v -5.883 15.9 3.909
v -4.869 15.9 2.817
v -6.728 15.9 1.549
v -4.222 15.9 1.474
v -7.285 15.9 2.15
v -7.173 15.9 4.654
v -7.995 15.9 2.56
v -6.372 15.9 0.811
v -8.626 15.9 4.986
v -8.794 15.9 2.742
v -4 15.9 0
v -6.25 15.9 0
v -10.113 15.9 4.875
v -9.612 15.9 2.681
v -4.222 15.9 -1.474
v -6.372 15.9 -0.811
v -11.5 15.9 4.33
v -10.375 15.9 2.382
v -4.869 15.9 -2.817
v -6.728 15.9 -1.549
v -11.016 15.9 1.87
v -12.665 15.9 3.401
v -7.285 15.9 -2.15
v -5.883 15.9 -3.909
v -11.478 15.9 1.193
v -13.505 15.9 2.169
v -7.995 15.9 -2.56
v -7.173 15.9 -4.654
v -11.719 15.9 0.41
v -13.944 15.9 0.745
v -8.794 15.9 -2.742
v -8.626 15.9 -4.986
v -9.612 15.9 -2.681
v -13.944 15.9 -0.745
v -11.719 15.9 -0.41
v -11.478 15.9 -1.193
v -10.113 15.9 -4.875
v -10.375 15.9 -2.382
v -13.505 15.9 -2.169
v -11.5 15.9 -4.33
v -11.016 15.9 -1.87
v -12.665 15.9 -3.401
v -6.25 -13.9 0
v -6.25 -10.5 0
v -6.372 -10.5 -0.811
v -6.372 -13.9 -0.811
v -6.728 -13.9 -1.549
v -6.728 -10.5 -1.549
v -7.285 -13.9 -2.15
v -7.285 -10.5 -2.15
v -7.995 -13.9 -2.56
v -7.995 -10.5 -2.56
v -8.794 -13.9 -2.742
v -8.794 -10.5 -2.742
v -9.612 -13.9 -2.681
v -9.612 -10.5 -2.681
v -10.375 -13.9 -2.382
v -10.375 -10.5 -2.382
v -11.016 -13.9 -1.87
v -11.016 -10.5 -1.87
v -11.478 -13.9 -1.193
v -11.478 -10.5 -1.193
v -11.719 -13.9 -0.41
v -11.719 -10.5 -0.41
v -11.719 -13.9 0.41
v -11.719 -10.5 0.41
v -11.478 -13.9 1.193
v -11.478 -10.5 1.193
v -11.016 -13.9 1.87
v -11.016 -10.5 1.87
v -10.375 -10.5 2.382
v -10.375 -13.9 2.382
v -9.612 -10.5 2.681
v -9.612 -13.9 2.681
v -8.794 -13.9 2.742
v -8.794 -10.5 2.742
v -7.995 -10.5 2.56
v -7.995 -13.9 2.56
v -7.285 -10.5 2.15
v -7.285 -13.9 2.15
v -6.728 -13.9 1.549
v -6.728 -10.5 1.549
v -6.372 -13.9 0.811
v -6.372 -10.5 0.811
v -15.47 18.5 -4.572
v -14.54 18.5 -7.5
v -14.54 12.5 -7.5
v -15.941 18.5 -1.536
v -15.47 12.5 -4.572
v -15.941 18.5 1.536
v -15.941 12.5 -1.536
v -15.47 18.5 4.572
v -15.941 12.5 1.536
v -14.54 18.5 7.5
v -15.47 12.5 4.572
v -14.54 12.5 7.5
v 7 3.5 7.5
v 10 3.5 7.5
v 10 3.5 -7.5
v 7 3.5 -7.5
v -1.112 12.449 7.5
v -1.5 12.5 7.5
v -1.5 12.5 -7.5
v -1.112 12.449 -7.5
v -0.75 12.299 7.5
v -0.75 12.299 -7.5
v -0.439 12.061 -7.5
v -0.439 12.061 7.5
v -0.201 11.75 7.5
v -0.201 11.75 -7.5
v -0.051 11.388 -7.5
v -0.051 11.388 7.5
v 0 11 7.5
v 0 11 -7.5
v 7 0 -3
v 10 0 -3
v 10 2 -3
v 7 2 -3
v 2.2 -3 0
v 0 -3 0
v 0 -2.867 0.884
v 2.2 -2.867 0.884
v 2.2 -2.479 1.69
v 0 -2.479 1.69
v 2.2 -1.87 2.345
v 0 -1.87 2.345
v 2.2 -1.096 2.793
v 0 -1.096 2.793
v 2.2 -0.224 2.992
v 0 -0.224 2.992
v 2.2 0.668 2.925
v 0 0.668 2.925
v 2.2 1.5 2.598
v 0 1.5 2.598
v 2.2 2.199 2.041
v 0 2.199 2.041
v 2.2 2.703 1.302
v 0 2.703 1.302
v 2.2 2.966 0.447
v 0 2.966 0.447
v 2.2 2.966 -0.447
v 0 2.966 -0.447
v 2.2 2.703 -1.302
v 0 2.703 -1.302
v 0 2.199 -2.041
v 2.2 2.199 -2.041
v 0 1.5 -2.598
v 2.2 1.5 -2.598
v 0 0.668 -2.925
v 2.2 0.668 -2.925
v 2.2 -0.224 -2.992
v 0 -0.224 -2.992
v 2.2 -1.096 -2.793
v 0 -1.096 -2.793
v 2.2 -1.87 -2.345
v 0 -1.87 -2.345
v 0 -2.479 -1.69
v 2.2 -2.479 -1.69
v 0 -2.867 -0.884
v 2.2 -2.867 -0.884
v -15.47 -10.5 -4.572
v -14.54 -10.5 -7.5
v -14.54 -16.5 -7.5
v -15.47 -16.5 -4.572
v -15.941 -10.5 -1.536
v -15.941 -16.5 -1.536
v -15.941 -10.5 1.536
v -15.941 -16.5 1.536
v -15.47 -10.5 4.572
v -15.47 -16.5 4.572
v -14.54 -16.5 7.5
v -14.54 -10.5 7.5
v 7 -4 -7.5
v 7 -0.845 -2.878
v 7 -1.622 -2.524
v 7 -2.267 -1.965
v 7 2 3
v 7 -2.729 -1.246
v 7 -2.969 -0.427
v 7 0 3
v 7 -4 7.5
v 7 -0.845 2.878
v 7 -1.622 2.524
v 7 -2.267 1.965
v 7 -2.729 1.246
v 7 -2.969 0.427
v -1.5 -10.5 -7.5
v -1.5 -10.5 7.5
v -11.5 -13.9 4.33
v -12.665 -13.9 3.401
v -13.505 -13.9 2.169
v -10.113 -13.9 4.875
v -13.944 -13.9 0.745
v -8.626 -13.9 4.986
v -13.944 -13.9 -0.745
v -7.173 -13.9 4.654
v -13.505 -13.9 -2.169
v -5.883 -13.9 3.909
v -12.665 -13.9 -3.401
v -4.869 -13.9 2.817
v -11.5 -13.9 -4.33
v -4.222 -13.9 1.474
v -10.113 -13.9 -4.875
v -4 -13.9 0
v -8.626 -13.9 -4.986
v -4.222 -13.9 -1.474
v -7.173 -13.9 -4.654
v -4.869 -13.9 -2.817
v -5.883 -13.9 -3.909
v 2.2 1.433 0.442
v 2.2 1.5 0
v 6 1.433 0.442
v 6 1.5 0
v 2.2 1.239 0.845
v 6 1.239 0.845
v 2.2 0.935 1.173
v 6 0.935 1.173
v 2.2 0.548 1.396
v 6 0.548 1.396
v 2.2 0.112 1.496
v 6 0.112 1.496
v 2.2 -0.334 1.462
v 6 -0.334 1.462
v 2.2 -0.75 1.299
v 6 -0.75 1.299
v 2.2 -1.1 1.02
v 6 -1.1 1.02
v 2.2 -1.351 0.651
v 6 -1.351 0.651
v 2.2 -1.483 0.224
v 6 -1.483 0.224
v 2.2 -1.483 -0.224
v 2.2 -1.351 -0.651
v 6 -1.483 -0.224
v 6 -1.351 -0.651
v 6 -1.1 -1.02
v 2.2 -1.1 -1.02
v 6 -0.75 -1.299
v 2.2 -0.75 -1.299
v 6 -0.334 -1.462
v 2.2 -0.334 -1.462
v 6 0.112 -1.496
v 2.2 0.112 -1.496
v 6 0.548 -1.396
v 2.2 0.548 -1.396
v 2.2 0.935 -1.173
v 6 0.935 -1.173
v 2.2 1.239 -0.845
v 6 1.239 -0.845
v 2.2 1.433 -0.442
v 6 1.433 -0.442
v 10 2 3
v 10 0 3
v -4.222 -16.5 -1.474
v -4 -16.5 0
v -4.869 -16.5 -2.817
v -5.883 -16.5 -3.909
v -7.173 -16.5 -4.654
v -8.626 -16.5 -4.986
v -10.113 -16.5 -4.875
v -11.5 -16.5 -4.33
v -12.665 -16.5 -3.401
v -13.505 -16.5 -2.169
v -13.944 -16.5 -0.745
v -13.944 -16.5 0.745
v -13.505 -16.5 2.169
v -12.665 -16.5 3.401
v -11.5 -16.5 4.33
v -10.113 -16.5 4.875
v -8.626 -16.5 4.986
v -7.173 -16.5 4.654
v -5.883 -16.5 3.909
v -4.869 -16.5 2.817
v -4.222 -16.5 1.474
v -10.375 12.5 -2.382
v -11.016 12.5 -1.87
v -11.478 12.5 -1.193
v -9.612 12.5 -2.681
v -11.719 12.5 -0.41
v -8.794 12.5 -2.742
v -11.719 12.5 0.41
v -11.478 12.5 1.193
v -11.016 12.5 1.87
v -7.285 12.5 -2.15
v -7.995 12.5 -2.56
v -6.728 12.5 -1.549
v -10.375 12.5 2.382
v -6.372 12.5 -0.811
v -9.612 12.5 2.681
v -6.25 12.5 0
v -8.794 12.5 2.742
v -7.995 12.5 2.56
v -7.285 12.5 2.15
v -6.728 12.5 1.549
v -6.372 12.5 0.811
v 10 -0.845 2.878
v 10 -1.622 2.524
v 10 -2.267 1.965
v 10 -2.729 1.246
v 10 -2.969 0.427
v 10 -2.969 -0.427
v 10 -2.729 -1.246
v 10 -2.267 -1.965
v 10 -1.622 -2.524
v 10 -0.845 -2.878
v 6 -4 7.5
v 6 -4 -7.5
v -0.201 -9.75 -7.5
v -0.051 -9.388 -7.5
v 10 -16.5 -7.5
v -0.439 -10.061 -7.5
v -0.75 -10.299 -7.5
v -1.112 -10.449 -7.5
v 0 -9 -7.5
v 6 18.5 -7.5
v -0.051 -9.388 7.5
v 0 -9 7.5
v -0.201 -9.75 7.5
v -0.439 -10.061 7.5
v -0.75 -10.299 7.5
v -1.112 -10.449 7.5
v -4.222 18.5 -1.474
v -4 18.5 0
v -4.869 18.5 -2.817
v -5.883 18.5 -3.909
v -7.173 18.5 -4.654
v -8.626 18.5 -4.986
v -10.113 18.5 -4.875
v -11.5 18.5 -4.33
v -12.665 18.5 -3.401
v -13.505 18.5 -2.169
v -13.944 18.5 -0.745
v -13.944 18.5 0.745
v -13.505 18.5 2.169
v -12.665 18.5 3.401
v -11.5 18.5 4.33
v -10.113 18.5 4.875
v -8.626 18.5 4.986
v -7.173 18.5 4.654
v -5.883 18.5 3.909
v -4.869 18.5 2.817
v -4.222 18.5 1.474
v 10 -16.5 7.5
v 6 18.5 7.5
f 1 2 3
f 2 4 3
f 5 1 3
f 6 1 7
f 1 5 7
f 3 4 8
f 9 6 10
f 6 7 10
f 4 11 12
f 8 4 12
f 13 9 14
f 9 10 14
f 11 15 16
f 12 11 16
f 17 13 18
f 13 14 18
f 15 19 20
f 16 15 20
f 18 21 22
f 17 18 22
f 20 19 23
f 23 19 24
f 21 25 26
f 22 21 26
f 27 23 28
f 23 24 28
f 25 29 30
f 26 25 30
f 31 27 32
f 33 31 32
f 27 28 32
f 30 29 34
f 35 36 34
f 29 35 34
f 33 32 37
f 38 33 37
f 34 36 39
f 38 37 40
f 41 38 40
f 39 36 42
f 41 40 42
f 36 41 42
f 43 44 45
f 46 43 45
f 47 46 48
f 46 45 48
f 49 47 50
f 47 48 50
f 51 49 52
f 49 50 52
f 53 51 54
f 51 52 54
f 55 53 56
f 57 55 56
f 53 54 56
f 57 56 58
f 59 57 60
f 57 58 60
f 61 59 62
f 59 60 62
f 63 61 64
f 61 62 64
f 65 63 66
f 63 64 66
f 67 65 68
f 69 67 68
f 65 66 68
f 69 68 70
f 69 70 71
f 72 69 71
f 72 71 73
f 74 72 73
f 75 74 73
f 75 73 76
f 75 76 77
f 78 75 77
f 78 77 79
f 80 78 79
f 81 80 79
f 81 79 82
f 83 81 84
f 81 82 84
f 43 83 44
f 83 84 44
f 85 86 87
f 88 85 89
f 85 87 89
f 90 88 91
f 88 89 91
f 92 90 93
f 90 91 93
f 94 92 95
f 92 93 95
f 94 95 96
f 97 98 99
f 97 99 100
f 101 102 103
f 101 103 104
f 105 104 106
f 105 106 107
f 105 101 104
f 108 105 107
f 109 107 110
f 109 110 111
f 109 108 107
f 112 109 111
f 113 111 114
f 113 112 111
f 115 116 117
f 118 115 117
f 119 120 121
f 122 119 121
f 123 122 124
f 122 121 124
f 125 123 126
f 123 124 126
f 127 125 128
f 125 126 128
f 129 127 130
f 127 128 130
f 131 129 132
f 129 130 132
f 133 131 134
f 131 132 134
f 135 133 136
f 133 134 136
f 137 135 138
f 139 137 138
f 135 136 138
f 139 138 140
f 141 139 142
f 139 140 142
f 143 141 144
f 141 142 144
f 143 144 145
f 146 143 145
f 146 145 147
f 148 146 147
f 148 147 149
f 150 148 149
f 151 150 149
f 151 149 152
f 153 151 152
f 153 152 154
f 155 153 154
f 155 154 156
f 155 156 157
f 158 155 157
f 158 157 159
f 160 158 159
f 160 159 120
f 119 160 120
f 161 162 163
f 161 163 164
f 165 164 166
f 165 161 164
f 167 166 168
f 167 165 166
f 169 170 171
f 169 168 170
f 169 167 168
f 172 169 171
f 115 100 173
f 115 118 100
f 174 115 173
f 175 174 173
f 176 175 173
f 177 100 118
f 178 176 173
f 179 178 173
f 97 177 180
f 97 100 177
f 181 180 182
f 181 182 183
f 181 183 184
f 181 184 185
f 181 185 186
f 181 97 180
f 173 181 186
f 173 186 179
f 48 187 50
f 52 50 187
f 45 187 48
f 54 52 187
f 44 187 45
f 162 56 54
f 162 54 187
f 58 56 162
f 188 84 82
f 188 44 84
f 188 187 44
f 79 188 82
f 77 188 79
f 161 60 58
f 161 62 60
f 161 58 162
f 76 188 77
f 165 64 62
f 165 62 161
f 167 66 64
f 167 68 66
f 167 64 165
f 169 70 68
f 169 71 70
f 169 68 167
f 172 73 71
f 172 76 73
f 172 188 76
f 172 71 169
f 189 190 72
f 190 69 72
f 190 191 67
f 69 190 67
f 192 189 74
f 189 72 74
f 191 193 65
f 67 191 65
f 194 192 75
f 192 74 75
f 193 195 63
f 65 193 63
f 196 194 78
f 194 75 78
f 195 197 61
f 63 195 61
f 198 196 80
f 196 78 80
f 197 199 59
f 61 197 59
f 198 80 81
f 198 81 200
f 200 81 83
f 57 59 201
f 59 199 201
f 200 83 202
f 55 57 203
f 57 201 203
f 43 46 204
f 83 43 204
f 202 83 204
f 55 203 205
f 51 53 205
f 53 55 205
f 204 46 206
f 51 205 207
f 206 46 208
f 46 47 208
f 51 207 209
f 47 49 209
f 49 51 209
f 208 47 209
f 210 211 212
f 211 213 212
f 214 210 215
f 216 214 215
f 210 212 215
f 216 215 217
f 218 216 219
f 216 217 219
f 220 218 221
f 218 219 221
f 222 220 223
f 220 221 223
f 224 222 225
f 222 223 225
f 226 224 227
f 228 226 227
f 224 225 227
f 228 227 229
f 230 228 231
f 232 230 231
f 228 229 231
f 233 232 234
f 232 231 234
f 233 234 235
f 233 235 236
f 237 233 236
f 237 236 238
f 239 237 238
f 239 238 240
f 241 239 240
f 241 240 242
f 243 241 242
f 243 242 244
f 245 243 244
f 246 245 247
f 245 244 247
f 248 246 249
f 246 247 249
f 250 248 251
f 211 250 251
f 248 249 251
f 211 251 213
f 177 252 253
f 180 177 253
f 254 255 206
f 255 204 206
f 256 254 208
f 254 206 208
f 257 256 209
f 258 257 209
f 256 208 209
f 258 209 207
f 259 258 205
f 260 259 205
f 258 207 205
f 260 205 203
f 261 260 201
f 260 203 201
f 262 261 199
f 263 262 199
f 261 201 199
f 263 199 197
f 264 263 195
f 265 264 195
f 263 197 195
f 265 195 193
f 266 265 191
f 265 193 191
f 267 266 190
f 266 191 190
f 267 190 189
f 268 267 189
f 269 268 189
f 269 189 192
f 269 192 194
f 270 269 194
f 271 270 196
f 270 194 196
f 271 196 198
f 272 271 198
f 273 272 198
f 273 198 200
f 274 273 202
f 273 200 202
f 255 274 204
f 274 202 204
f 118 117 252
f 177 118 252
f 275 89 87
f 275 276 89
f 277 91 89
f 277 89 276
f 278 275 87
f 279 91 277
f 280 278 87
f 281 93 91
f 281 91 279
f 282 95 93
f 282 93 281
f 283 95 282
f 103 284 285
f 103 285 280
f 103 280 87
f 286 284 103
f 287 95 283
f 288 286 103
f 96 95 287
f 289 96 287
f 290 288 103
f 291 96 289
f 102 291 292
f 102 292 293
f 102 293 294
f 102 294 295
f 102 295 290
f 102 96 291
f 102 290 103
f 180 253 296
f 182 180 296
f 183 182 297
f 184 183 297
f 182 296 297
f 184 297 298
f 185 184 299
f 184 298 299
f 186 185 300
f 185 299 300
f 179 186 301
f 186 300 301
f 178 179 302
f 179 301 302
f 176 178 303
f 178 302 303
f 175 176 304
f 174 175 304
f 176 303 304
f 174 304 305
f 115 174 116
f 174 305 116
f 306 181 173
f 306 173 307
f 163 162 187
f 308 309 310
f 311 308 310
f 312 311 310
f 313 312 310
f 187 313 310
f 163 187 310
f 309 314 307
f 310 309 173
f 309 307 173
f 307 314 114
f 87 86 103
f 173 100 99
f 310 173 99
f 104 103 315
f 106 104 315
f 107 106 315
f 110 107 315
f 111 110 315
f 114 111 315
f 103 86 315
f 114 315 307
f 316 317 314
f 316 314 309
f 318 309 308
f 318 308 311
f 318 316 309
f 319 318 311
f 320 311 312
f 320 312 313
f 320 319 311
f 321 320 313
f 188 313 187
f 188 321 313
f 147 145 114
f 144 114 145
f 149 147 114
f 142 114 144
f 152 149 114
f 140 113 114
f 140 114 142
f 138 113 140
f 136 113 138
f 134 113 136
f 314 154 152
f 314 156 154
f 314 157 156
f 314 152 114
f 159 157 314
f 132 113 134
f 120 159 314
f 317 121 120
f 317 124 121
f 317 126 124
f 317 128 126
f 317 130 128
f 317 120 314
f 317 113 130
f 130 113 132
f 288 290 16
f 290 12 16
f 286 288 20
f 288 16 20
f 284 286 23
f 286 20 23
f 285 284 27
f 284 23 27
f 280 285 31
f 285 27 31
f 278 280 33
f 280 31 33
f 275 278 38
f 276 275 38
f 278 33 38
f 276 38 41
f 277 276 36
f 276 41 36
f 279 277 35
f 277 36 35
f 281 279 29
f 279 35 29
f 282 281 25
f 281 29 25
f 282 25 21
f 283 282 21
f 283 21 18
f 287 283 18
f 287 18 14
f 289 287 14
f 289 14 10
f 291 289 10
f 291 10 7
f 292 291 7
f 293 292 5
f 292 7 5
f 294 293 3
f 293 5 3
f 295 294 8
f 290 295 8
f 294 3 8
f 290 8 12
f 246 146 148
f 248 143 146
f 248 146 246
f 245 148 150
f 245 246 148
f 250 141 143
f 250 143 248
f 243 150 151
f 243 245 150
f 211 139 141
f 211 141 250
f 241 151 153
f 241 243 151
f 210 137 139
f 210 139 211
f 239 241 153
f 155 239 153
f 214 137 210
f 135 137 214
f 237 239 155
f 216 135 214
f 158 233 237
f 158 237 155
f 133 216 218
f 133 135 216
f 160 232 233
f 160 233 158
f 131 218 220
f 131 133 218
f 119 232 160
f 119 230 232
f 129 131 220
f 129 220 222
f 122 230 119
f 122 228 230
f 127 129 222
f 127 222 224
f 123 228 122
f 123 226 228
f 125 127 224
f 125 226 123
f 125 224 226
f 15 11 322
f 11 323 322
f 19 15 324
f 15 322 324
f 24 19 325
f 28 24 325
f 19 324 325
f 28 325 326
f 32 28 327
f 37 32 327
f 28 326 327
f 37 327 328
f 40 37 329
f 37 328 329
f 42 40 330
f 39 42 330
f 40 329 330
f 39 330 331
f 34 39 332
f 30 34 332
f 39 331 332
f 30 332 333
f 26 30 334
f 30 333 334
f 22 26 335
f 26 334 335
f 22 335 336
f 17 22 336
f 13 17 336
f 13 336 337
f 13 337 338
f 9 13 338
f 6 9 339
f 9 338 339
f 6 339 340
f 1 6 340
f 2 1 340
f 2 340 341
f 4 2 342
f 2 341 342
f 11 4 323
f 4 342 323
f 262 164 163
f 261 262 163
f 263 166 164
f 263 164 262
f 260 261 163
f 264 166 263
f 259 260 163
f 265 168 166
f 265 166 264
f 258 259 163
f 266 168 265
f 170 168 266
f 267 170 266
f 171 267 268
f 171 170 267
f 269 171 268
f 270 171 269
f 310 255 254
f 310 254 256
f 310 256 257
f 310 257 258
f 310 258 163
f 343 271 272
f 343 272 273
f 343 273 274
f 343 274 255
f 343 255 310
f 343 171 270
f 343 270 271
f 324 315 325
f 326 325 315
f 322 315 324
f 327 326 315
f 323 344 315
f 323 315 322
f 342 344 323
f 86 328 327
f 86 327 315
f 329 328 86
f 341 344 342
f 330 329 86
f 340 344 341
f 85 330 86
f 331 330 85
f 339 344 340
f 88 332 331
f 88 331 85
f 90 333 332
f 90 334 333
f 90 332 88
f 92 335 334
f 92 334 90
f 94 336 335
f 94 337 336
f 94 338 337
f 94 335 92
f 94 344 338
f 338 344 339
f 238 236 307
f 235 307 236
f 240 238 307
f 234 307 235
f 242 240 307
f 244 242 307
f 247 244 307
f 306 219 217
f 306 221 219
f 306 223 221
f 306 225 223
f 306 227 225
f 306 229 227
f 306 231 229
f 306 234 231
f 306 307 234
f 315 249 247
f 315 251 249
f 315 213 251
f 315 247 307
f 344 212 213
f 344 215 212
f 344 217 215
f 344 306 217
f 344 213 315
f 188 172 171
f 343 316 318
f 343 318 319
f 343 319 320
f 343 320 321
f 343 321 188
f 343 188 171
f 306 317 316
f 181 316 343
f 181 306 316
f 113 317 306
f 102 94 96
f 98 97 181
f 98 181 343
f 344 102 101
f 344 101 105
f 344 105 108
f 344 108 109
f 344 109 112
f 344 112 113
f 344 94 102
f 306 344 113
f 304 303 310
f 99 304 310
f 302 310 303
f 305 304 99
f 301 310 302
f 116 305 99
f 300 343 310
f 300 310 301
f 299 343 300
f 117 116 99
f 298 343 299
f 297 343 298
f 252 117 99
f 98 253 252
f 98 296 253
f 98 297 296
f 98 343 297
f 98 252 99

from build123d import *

# Parameters (mm, degrees)
F1_DEPTH       = 7.5
F3_D           = 3
F3_CBORE_D     = 6
F3_CBORE_DEPTH = 2.2
F5_DEPTH       = 3
F9_DEPTH       = 18.501
F9_DEPTH_BACK  = 16.501


with BuildPart() as f1:
    # F0 (on Top) → F1 (new body, symmetric)
    with BuildSketch(Plane.XY):
        with BuildLine():
            Line((-16, 18.5), (-16, 12.5))
            Line((-16, 12.5), (-1.5, 12.5))
            ThreePointArc((-1.5, 12.5), (-0.4393398282, 12.0606601718), (0, 11))
            Line((0, 11), (0, -9))
            ThreePointArc((0, -9), (-0.4393398282, -10.0606601718), (-1.5, -10.5))
            Line((-1.5, -10.5), (-16, -10.5))
            Line((-16, -10.5), (-16, -16.5))
            Line((-16, -16.5), (10, -16.5))
            Line((10, -16.5), (10, 3.5))
            Line((10, 3.5), (7, 3.5))
            Line((7, 3.5), (7, -4))
            Line((7, -4), (6, -4))
            Line((6, -4), (6, 18.5))
            Line((6, 18.5), (-16, 18.5))
        make_face()
    extrude(amount=F1_DEPTH, both=True)

    # F3 (through all)
    with Locations(Plane(origin=(0, 0, 0), x_dir=(0, -1, 0), z_dir=(-1, 0, 0))):
        with Locations((0, 0)):
            CounterBoreHole(F3_D / 2, F3_CBORE_D / 2, F3_CBORE_DEPTH)

    # F4 (on face) → F5 (cut, through all)
    with BuildSketch(Plane.YZ.offset(10)):
        with BuildLine():
            Line((2, 3), (0, 3))
            ThreePointArc((0, 3), (-3, 0), (0, -3))
            Line((0, -3), (2, -3))
            Line((2, -3), (2, 3))
        make_face()
    extrude(amount=-F5_DEPTH, mode=Mode.SUBTRACT)

    # F6 (on Top) → F7 (revolve, cut)
    with BuildSketch(Plane.XY):
        Polygon((-9, -16.5), (-4, -16.5), (-4, -13.9), (-6.25, -13.9), (-6.25, 15.9), (-4, 15.9), (-4, 18.5), (-9, 18.5), align=None)
    revolve(axis=Axis((-9, 21, 0), (0, 1, 0)), mode=Mode.SUBTRACT)

    # F8 (on Front) → F9 (cut, two sides)
    with BuildSketch(Plane.XZ) as f9_sk:
        with BuildLine():
            ThreePointArc((-14.5404962177, -7.5), (-16, 0), (-14.5404962177, 7.5))
            Line((-14.5404962177, 7.5), (-17.27, 7.5))
            Line((-17.27, 7.5), (-17.27, -7.5))
            Line((-17.27, -7.5), (-14.5404962177, -7.5))
        make_face()
    extrude(amount=-F9_DEPTH, mode=Mode.SUBTRACT)
    extrude(f9_sk.sketch, amount=F9_DEPTH_BACK, mode=Mode.SUBTRACT)


solid = f1.part
